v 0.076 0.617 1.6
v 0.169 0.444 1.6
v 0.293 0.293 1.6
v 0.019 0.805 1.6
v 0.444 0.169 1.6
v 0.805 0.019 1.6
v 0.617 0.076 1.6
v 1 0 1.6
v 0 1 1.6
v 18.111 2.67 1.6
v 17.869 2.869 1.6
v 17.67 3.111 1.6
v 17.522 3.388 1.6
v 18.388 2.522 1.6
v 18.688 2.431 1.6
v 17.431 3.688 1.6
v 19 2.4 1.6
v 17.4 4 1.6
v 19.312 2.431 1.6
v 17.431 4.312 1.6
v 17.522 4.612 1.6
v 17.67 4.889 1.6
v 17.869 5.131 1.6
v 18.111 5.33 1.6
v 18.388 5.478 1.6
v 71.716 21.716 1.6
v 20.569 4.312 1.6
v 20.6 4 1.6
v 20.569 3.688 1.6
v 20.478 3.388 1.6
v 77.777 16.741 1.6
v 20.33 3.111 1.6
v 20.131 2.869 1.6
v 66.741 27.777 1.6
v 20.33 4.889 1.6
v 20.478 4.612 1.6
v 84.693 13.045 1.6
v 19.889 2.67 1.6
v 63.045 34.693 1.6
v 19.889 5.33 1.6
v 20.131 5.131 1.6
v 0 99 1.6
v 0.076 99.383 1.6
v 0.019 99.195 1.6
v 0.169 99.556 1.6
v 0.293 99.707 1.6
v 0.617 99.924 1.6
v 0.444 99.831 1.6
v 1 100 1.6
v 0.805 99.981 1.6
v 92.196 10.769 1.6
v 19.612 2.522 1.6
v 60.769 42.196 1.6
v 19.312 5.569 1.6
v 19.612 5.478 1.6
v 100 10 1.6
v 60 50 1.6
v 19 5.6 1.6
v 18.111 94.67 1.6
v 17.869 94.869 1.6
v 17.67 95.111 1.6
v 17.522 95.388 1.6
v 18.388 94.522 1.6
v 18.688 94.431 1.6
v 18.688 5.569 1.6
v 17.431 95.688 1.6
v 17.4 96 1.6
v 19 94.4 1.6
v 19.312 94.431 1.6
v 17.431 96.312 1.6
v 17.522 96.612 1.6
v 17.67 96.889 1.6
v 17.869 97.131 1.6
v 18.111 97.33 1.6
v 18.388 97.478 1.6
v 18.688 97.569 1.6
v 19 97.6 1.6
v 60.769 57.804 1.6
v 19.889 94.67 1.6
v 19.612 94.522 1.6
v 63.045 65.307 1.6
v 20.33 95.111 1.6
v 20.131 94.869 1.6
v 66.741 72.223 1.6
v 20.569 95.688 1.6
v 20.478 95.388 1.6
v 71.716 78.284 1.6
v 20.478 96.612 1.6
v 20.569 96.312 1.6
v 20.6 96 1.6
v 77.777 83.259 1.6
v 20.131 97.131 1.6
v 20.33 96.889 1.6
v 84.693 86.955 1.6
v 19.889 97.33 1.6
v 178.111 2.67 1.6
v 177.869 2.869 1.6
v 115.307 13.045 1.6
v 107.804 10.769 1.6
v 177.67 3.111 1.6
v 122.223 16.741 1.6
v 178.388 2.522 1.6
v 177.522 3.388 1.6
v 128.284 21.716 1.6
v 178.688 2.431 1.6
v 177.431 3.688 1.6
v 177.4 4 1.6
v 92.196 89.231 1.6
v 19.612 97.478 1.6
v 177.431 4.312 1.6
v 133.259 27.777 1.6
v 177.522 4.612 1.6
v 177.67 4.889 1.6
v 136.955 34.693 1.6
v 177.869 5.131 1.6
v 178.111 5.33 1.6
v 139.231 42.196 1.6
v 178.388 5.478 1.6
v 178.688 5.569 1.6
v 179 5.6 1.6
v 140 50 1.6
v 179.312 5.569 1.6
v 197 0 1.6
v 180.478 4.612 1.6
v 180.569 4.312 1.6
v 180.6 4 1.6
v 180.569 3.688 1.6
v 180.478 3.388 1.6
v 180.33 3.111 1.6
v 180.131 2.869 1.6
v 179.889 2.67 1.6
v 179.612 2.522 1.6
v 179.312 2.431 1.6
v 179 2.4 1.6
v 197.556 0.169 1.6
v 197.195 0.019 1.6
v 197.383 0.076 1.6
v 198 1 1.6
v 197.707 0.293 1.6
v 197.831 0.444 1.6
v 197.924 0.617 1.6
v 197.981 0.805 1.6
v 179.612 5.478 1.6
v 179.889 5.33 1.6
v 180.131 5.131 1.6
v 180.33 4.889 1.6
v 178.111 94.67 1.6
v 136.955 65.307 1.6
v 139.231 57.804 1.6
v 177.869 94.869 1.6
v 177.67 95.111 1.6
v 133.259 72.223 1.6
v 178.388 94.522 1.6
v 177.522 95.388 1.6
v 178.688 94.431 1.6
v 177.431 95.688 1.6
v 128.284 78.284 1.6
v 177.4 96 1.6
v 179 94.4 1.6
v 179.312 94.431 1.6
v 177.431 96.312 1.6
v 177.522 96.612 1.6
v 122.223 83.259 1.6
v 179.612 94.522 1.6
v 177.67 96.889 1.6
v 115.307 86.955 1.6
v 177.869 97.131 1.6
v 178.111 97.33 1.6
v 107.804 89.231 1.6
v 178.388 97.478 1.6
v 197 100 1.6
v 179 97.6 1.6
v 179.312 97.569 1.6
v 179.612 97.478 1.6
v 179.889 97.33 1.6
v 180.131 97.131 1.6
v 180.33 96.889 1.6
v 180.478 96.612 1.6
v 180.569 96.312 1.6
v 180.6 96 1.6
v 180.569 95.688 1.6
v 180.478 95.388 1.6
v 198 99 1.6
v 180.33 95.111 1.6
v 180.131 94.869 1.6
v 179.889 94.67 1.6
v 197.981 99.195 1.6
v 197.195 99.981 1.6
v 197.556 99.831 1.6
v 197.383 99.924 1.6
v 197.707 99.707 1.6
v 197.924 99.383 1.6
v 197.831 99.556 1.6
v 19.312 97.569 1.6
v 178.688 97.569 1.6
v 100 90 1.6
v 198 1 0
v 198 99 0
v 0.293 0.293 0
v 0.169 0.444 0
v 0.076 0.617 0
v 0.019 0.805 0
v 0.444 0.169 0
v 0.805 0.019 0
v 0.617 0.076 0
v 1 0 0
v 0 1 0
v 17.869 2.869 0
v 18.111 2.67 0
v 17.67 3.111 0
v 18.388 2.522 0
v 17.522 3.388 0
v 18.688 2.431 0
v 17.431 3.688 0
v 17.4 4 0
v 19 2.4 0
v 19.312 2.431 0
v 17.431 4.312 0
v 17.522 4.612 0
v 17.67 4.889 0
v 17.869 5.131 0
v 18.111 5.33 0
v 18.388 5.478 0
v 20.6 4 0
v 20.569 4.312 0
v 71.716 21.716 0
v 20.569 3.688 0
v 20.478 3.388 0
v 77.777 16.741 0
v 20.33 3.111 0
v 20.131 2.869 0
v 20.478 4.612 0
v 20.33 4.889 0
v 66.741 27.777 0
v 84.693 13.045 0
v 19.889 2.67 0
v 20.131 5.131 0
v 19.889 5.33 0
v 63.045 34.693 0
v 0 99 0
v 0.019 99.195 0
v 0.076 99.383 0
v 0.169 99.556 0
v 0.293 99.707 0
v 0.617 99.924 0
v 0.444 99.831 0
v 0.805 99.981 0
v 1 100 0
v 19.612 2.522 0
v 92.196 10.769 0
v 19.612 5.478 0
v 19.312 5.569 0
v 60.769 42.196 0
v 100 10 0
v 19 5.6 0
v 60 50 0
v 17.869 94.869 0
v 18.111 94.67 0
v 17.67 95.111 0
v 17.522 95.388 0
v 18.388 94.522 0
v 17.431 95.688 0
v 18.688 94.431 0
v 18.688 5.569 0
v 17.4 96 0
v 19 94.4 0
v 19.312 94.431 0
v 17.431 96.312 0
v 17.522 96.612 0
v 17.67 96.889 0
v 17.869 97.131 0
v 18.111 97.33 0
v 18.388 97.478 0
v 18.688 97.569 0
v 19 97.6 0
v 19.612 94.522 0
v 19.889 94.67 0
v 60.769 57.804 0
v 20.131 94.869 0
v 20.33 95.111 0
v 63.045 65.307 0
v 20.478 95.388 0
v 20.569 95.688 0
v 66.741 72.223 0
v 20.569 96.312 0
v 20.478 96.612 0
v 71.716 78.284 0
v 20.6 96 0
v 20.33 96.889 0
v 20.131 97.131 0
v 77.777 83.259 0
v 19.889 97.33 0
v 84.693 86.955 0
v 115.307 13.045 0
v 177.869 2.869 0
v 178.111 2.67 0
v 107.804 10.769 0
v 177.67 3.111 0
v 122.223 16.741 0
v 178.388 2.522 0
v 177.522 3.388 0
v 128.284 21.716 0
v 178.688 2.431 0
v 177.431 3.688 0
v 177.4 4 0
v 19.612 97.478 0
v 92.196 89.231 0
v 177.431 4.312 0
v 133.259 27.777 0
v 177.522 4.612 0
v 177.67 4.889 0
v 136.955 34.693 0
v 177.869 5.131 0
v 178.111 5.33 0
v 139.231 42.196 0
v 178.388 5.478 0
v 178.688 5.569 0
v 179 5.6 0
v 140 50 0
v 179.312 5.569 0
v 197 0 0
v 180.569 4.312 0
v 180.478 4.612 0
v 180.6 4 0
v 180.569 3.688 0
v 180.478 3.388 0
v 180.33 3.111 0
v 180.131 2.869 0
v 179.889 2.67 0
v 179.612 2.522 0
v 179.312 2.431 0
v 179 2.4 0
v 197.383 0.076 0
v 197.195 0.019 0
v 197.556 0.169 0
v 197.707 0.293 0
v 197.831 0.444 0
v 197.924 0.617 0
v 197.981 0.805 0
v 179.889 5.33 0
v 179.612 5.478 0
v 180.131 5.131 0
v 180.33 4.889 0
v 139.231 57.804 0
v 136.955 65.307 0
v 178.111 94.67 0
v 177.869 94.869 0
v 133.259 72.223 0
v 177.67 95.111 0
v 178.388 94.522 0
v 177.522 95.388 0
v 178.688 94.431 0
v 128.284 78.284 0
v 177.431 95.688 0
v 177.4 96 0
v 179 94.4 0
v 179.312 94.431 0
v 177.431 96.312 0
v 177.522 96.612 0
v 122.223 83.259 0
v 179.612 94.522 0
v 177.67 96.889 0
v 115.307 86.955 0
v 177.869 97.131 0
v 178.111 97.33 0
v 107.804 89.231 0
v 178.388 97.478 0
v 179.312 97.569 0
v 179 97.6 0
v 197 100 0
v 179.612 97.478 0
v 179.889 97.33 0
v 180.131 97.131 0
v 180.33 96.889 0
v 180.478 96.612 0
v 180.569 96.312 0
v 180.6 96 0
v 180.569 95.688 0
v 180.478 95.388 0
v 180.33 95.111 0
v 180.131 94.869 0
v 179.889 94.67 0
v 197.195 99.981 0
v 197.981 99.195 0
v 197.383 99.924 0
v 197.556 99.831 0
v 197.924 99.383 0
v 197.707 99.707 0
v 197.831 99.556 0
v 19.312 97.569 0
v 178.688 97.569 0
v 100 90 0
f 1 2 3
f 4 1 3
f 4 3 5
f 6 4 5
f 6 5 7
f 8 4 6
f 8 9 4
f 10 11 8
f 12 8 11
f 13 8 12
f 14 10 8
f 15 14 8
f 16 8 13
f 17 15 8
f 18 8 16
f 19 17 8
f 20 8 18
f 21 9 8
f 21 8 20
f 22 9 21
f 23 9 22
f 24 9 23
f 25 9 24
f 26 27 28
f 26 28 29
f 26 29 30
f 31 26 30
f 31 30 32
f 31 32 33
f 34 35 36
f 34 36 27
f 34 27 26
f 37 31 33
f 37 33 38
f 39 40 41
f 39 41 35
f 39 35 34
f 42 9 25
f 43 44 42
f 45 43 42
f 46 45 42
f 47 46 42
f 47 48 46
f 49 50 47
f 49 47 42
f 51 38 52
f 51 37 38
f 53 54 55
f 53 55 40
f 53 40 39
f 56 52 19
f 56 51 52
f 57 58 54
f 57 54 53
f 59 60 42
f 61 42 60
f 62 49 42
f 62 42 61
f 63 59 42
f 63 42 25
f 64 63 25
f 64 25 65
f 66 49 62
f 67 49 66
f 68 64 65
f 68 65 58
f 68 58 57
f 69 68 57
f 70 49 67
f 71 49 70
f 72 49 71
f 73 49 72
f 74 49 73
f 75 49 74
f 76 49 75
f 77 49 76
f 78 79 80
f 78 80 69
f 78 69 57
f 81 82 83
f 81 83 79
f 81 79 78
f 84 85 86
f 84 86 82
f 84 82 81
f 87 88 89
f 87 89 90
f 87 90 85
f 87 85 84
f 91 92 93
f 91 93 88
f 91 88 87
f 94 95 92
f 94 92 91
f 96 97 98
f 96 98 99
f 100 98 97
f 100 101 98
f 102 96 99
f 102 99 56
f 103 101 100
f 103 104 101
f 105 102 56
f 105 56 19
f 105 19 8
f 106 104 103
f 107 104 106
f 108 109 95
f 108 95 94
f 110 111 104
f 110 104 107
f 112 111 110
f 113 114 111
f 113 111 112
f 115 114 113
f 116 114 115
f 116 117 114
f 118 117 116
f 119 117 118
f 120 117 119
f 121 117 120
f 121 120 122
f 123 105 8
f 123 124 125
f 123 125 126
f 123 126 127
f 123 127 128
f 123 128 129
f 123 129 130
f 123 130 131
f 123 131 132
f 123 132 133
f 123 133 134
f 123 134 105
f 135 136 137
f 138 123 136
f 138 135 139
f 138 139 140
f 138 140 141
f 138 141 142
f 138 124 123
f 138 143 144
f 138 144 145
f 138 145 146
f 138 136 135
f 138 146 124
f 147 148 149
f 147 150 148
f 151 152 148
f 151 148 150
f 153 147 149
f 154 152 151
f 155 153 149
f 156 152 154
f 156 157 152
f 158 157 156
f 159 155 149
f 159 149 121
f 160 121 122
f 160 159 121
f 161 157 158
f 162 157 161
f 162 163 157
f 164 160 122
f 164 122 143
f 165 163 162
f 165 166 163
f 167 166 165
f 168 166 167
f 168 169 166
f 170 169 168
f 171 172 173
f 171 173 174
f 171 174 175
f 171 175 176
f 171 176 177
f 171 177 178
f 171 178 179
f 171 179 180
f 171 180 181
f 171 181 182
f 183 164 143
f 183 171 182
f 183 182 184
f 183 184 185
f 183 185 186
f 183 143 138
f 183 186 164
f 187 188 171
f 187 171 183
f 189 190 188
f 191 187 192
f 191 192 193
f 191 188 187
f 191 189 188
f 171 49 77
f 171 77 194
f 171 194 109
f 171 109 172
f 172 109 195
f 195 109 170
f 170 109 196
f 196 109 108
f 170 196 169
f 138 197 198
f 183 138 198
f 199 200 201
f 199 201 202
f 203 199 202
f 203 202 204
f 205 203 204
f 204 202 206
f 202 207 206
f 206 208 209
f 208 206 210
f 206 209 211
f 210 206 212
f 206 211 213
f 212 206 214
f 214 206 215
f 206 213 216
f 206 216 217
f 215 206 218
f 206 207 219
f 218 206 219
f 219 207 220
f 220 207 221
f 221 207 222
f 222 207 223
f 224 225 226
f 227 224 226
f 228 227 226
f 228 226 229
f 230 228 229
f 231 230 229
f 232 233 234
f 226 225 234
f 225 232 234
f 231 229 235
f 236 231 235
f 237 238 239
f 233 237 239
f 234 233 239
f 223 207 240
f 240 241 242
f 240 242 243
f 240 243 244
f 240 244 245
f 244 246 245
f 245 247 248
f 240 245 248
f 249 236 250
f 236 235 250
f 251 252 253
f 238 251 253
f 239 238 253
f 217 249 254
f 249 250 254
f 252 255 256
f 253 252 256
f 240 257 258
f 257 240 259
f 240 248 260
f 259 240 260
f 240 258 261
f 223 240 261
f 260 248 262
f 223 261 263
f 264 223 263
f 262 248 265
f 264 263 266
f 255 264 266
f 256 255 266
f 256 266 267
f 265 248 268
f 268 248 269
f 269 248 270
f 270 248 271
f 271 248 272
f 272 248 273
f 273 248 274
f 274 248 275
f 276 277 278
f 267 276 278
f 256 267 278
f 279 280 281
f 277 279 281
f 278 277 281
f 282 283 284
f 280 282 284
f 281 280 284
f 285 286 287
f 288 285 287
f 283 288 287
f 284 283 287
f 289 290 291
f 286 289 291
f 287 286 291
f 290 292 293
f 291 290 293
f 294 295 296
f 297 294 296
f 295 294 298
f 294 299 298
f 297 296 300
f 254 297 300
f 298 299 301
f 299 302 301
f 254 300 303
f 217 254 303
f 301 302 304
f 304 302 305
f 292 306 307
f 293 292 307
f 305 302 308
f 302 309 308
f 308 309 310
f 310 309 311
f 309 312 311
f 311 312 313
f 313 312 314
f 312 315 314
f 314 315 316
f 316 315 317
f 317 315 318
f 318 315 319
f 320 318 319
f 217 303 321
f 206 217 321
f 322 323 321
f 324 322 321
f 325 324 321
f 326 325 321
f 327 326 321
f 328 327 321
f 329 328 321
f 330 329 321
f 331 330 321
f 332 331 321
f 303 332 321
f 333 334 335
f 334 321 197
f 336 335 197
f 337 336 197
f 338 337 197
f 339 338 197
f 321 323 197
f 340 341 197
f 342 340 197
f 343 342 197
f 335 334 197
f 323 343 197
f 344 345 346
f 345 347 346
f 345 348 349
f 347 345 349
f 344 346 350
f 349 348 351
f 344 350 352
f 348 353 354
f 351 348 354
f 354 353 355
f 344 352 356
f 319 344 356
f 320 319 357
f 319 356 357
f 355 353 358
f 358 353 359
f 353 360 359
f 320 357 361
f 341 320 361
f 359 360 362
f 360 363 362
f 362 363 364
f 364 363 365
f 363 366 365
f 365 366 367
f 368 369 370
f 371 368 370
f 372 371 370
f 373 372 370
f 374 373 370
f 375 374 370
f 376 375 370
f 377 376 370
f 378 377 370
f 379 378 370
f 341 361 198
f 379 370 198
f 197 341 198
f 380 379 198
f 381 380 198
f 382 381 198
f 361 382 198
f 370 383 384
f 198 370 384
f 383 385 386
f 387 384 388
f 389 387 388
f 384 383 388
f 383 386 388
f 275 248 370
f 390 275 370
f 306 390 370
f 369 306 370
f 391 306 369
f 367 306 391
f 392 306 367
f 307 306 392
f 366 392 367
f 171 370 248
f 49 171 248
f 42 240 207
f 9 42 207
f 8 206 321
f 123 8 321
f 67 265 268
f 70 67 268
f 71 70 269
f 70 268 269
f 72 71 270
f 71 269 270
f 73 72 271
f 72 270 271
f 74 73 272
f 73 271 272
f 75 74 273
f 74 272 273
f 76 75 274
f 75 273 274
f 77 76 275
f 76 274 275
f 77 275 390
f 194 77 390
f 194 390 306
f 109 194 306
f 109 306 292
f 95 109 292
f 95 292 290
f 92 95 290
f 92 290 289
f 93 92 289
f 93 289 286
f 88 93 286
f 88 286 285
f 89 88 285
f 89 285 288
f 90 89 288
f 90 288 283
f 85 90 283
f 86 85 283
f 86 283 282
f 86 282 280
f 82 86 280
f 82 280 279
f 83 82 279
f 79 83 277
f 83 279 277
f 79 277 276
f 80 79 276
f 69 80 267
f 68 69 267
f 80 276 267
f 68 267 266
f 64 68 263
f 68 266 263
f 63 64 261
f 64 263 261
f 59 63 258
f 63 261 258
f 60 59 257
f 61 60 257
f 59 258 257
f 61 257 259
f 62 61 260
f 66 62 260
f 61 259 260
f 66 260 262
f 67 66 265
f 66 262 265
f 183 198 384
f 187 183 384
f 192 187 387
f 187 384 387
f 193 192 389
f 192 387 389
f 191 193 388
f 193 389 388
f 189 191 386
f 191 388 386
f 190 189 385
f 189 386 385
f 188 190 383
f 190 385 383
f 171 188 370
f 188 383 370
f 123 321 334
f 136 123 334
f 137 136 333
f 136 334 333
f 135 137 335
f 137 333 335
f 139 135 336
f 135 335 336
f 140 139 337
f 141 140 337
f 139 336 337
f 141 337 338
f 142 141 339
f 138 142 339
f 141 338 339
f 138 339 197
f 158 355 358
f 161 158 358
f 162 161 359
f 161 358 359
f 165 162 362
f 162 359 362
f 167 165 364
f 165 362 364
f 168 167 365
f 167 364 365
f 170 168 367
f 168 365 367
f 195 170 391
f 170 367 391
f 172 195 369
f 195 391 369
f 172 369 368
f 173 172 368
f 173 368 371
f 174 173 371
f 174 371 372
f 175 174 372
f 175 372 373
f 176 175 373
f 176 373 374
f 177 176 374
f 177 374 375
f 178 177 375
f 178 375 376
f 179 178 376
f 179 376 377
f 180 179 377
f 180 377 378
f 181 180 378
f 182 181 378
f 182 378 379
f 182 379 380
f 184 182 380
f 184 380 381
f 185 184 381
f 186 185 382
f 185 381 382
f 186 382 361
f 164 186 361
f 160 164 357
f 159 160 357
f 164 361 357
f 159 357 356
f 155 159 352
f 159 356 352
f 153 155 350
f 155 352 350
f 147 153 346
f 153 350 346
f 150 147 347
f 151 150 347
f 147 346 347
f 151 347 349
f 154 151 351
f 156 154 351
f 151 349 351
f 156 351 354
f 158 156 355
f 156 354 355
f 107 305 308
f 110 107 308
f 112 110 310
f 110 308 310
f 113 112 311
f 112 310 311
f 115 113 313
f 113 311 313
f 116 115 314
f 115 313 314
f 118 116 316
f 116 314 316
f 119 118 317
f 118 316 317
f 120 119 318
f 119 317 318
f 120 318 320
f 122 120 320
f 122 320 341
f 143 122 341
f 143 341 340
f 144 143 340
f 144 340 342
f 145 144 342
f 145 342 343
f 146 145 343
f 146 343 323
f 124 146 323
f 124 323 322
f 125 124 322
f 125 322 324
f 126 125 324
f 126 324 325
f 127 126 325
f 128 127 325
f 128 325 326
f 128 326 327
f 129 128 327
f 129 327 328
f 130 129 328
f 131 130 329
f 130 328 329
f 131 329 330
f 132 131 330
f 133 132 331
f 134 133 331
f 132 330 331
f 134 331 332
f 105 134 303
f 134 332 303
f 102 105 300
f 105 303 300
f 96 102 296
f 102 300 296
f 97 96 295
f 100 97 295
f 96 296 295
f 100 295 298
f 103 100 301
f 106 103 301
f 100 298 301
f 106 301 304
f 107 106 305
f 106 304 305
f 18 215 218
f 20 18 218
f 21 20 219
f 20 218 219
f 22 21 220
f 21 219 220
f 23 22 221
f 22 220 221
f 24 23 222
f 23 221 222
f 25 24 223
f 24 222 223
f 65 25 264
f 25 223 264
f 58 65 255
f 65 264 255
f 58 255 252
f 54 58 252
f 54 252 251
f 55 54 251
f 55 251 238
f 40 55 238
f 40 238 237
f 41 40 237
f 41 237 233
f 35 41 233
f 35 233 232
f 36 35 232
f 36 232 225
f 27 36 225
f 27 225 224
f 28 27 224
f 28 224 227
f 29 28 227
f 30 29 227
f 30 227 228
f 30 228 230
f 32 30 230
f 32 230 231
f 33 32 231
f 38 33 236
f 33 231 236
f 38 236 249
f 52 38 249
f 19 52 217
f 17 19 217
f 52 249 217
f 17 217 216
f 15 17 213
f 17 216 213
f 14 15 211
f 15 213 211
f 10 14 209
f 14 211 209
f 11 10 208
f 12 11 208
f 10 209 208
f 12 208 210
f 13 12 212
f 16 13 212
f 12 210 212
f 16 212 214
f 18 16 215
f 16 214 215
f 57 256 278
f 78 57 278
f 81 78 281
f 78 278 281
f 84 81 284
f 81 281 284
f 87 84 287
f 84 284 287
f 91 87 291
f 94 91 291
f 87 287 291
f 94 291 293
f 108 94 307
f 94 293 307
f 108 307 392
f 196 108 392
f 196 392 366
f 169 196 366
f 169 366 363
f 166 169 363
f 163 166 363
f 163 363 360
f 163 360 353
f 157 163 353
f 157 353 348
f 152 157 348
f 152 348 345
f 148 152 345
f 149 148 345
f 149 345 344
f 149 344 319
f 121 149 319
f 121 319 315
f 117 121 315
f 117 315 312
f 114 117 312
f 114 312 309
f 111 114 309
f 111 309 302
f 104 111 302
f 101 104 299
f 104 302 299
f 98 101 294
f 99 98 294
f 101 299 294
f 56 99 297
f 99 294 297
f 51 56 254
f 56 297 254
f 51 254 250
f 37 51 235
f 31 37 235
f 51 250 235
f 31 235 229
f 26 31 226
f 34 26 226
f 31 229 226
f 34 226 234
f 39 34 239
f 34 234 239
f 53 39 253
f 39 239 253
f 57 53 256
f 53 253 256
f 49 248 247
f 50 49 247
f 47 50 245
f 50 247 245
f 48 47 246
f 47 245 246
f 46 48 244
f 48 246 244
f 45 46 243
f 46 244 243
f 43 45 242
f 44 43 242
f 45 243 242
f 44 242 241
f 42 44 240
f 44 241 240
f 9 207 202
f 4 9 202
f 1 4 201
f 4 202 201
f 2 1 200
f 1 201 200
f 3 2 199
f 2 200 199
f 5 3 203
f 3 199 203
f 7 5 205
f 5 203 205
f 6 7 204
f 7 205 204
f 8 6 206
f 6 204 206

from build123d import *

# Parameters (mm, degrees)
BOSS_EXTRU_1_DEPTH      = 1.6
ESQUISSE3_R             = 1.6
ESQUISSE3_R_2           = 40
ENL_V_MAT_EXTRU_1_DEPTH = 2.6


with BuildPart() as part:
    # Esquisse1 → Boss.-Extru.1 (new body)
    with BuildSketch(Plane.XY):
        with BuildLine():
            Line((1, 0), (197, 0))
            ThreePointArc((197, 0), (197.707106781, 0.292893219), (198, 1))
            Line((198, 1), (198, 99))
            ThreePointArc((198, 99), (197.707106781, 99.707106781), (197, 100))
            Line((197, 100), (1, 100))
            ThreePointArc((1, 100), (0.292893219, 99.707106781), (0, 99))
            Line((0, 99), (0, 1))
            ThreePointArc((0, 1), (0.292893219, 0.292893219), (1, 0))
        make_face()
    extrude(amount=BOSS_EXTRU_1_DEPTH)

    # Esquisse3 → Enlèv. mat.-Extru.1 (cut, through all)
    with BuildSketch(Plane(origin=(0, 0, 0), x_dir=(-1, 0, 0), z_dir=(0, 0, -1))):
        with Locations((-179, 96)):
            Circle(ESQUISSE3_R)
        with Locations((-179, 4)):
            Circle(ESQUISSE3_R)
        with Locations((-19, 4)):
            Circle(ESQUISSE3_R)
        with Locations((-19, 96)):
            Circle(ESQUISSE3_R)
        with Locations((-100, 50)):
            Circle(ESQUISSE3_R_2)
    extrude(amount=-ENL_V_MAT_EXTRU_1_DEPTH, mode=Mode.SUBTRACT)


solid = part.part
